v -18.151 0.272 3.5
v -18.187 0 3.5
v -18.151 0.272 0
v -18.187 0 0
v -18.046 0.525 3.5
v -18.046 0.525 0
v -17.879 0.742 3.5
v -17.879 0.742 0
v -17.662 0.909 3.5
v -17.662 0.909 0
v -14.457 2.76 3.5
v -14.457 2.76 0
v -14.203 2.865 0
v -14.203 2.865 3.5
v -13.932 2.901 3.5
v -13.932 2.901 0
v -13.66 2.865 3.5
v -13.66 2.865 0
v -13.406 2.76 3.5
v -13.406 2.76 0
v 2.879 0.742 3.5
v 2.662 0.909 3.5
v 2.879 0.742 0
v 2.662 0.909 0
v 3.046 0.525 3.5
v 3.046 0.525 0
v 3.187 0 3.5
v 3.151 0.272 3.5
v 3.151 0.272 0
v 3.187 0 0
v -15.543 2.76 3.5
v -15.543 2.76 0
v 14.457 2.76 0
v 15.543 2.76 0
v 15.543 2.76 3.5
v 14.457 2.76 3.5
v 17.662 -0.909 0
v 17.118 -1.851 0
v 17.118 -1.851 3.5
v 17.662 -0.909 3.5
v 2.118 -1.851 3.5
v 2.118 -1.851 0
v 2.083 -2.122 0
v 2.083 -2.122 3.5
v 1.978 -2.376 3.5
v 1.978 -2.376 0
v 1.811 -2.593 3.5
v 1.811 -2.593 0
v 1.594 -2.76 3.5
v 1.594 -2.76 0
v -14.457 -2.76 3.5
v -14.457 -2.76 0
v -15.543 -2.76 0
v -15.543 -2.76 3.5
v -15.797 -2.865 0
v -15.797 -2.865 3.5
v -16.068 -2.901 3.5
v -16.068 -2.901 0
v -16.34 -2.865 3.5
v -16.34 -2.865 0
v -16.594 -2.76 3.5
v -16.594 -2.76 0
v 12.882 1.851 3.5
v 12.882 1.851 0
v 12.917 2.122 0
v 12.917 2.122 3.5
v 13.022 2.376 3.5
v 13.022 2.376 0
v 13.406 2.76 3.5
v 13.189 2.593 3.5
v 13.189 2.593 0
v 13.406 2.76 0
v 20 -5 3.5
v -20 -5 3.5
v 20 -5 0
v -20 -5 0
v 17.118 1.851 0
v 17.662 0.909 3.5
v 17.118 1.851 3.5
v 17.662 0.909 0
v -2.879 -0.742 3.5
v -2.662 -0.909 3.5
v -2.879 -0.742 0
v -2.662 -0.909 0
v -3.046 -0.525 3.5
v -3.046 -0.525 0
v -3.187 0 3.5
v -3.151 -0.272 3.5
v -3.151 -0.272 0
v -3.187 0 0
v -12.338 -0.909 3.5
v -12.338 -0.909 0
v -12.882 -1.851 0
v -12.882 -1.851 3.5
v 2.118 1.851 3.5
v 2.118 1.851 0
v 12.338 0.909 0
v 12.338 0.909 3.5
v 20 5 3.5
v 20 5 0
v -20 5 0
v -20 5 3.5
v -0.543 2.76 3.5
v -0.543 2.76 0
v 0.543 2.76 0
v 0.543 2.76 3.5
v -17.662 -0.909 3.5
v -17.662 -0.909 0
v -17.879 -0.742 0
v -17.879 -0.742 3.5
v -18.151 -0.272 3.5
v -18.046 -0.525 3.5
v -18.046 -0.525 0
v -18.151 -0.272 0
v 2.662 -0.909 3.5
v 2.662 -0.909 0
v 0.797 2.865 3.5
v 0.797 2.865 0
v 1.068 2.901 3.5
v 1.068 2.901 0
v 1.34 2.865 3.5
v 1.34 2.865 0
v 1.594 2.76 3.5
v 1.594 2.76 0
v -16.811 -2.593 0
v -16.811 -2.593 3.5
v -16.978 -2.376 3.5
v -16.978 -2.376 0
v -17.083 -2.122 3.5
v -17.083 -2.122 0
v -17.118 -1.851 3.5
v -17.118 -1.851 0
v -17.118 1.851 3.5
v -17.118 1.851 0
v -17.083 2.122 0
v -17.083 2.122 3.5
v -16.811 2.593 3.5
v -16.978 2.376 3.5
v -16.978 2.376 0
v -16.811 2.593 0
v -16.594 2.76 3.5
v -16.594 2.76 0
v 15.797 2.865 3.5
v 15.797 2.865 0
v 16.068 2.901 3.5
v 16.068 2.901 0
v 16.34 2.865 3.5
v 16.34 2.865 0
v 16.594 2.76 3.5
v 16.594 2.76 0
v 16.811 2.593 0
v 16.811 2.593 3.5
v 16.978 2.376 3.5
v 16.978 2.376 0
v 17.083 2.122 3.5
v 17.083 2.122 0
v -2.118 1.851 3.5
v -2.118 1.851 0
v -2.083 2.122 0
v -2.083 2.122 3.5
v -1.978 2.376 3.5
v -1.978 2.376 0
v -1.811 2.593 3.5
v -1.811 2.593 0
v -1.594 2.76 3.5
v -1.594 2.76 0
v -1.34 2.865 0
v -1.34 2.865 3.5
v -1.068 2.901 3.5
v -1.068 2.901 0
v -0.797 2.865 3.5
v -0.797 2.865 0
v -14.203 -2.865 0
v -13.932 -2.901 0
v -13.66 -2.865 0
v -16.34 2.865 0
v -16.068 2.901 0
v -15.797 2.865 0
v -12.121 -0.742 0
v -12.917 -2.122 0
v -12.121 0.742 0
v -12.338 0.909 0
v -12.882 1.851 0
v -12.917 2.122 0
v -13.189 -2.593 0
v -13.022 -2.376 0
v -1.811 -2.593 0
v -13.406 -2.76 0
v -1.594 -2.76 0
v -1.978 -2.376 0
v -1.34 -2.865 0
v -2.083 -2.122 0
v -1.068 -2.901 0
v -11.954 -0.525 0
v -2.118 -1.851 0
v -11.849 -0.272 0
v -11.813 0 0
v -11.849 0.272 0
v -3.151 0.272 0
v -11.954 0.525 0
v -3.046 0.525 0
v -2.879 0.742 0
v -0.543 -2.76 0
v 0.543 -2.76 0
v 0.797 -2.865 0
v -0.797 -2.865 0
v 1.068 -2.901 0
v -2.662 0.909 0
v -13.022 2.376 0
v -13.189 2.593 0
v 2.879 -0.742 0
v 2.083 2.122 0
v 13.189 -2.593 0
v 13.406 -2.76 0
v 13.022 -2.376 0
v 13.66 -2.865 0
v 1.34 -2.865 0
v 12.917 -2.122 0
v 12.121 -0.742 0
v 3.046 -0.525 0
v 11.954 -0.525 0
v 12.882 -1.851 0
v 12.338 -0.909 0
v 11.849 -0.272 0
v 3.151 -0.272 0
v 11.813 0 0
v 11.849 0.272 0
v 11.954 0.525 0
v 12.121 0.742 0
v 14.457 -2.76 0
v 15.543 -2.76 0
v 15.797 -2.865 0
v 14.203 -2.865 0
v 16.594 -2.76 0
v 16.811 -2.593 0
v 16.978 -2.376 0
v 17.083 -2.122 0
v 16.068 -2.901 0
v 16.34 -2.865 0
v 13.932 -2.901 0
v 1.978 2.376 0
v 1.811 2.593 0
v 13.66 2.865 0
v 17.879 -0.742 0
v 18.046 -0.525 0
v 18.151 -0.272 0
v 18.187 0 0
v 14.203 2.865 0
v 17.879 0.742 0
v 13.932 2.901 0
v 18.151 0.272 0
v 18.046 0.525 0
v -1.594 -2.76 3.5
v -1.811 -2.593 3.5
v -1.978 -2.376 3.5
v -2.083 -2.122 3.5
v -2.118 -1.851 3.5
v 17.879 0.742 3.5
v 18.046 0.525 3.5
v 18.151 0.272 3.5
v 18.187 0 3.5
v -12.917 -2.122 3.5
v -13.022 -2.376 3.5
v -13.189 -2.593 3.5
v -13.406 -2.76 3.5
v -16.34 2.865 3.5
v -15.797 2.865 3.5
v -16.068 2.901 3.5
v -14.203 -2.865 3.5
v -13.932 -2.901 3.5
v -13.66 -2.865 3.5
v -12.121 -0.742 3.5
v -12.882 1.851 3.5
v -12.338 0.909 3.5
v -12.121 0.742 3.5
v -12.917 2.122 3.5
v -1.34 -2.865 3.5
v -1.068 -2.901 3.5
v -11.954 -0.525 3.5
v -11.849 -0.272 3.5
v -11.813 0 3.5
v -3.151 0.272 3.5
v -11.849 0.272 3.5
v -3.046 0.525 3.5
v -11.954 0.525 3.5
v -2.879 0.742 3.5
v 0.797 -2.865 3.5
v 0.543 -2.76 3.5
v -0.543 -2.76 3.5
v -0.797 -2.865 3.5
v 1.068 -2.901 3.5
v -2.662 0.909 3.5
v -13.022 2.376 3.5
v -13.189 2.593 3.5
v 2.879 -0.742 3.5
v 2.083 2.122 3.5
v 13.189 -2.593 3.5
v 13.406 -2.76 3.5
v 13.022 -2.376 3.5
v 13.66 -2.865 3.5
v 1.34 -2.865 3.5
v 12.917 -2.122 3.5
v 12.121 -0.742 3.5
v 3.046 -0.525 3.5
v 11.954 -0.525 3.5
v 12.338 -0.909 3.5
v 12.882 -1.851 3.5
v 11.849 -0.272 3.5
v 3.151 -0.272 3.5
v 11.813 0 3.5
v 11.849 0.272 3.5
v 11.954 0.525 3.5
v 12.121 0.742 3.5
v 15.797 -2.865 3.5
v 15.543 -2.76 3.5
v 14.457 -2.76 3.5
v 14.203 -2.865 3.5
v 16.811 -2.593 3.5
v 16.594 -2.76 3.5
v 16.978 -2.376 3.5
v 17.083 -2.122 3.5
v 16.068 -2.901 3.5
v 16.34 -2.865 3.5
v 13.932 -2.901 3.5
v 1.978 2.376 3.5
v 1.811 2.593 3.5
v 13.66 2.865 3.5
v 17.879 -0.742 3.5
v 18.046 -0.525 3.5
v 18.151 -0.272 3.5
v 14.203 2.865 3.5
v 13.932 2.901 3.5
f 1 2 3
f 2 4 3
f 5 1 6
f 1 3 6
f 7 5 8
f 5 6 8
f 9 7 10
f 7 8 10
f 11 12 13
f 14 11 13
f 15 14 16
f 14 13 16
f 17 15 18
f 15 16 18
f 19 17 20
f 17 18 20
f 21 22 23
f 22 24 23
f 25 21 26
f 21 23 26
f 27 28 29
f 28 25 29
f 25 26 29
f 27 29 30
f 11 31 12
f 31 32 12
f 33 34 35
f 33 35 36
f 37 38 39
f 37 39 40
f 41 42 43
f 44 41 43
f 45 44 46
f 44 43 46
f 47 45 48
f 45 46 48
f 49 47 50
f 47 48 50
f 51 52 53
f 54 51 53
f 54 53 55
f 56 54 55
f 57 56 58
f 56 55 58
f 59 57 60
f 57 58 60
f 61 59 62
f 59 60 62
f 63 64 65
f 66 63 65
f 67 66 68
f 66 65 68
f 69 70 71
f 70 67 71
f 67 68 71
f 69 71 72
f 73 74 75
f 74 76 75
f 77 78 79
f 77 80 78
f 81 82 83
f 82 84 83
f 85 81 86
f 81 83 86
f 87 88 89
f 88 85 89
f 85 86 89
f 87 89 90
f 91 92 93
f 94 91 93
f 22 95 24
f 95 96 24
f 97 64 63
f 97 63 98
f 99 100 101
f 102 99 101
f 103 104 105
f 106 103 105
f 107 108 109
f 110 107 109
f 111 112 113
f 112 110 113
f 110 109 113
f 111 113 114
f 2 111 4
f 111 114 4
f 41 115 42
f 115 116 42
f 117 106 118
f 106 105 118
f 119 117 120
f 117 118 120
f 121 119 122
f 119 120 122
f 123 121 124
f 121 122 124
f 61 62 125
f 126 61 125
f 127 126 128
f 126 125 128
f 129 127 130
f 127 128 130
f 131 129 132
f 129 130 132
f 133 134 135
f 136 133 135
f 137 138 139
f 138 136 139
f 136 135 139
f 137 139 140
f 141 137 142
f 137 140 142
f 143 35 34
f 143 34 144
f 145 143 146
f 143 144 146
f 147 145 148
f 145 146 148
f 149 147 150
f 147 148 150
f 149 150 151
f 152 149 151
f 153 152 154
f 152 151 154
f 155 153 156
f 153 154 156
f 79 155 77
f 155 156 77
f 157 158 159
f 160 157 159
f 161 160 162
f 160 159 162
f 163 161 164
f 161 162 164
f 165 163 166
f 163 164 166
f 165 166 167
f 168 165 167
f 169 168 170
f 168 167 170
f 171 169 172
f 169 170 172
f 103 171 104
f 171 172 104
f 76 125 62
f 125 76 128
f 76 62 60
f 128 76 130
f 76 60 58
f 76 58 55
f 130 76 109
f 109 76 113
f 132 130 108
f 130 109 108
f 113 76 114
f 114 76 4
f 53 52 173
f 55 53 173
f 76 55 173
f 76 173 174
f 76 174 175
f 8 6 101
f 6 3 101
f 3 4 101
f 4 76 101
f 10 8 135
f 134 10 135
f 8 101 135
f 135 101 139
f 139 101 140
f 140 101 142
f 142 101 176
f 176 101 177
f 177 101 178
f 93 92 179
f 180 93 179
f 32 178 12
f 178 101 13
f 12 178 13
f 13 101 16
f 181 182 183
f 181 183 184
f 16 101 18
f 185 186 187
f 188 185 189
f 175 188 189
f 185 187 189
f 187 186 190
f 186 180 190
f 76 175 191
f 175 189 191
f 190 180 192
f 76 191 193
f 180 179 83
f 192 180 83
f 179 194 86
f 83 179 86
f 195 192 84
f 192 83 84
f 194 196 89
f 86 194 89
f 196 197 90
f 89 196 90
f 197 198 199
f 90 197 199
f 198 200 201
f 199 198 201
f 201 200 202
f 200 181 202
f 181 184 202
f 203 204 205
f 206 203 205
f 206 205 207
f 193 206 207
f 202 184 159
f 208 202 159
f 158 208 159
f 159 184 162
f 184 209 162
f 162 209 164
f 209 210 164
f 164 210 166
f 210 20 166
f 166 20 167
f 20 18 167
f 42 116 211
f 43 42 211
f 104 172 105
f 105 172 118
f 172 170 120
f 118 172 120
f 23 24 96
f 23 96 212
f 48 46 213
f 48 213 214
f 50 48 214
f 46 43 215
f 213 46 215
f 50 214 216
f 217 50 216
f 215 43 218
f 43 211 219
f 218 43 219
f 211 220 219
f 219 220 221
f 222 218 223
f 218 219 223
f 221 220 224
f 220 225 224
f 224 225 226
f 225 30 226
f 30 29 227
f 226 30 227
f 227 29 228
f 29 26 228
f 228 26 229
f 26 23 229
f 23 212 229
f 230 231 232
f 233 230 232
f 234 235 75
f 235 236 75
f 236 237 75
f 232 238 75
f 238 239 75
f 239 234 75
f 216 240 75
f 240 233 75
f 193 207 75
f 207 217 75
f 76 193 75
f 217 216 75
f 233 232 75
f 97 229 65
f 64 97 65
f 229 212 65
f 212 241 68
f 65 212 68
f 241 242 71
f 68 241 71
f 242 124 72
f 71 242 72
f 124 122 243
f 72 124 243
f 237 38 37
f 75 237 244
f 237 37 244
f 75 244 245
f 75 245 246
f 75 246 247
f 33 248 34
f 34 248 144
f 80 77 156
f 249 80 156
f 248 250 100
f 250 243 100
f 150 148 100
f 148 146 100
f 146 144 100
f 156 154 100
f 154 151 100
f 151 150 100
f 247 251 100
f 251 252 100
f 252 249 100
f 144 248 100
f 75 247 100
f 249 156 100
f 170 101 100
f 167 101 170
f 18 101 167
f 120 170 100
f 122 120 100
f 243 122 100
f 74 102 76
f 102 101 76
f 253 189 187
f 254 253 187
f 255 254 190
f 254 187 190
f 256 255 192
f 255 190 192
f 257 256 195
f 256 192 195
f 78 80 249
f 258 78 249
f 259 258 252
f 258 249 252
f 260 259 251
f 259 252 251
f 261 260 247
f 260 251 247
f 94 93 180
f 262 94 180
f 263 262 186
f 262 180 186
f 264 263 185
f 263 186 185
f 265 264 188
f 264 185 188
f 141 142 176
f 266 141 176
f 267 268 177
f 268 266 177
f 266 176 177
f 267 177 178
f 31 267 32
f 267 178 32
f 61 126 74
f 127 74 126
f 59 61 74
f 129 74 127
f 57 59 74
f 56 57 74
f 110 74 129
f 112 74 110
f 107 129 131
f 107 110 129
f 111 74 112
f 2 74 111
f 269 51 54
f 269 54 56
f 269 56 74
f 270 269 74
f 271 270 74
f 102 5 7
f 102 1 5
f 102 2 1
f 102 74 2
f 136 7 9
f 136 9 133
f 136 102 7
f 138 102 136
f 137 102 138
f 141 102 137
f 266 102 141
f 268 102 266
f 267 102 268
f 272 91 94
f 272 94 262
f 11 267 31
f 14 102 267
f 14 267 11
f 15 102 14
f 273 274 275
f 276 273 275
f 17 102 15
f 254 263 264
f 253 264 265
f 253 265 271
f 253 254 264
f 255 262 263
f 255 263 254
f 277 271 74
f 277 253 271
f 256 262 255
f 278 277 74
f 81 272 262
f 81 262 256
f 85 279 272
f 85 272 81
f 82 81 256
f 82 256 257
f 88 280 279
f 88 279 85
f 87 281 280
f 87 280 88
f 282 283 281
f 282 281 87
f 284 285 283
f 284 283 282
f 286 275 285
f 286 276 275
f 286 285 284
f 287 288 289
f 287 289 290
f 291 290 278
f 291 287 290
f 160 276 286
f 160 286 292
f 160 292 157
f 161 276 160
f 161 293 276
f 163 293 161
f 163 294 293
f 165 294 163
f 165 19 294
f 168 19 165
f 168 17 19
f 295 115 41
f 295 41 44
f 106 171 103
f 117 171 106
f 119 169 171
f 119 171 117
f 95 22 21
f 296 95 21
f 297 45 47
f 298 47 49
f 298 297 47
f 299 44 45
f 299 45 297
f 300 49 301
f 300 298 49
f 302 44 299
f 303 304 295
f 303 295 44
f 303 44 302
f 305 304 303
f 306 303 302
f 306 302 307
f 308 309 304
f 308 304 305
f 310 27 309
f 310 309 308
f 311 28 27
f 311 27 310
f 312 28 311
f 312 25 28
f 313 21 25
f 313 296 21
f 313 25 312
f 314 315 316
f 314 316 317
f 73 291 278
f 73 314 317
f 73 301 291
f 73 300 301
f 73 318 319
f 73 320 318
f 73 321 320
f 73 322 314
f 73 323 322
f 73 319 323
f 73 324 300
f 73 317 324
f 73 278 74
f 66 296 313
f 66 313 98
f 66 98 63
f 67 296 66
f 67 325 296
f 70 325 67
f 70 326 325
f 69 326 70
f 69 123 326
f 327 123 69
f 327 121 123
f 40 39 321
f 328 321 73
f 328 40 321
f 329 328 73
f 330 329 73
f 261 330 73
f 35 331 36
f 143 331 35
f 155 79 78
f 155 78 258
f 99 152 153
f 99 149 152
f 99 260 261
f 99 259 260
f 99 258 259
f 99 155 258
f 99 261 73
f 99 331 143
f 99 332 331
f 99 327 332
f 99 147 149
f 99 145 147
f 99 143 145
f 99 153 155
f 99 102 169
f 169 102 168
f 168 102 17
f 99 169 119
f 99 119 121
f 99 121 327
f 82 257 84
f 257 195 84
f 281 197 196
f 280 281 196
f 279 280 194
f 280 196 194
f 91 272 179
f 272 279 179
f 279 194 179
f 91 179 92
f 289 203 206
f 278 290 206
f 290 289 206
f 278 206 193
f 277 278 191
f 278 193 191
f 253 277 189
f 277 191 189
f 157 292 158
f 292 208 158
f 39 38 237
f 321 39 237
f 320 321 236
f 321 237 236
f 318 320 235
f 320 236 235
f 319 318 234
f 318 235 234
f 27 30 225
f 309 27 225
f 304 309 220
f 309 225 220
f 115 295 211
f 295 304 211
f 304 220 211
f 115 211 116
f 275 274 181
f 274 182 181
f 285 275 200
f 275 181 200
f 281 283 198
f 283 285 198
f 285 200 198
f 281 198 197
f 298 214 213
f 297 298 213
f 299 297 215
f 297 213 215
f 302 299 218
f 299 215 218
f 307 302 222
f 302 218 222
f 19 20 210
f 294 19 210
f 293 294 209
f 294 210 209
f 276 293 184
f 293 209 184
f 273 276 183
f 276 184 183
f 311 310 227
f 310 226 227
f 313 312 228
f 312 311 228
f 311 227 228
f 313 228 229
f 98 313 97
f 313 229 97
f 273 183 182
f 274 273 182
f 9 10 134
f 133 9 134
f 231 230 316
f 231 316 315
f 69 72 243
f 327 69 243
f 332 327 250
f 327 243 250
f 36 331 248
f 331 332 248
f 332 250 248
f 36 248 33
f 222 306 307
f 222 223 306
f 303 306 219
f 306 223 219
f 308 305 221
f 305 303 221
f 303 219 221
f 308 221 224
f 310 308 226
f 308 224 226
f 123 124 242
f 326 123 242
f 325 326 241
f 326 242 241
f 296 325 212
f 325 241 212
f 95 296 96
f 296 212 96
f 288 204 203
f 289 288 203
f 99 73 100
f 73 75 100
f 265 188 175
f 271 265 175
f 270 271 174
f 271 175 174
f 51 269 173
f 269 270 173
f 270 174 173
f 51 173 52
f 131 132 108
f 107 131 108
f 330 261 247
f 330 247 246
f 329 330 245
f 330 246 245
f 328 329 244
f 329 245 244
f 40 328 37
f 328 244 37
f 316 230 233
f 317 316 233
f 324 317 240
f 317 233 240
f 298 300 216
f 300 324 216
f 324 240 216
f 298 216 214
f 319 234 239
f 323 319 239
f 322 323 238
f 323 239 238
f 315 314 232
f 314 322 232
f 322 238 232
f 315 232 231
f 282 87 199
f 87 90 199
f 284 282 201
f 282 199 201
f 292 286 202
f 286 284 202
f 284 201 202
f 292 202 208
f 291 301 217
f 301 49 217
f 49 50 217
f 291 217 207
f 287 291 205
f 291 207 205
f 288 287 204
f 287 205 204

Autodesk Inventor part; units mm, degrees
ref_plane "YZ Plane" through (0, 0, 0) normal (1, 0, 0) x (0, 1, 0)
ref_plane "XZ Plane" through (0, 0, 0) normal (0, 1, 0) x (-1, 0, 0)
ref_plane "XY Plane" through (0, 0, 0) normal (0, 0, 1) x (1, 0, 0)
sketch "スケッチ1" plane through (0, 0, 0) normal (0, 0, 1) x (1, 0, 0)
  line L0 (-20, -5) -> (20, -5)
  line L1 (20, -5) -> (20, 5)
  line L2 (20, 5) -> (-20, 5)
  line L3 (-20, 5) -> (-20, -5)
  line L4 (-20, -5) -> (20, 5) construction
  line L5 (20, -5) -> (-20, 5) construction
  circle A0 centre (-15, 0) radius 1.55
  circle A1 centre (0, 0) radius 1.55
  line L6 (0, 0) -> (0, 5) construction
  line L7 (-12.5995, 5) -> (4.4005, 5) construction
  line L8 (-8.5, -4) -> (8.5, -4) construction
  line L9 (-13.4065, -2.76) -> (-16.5935, -2.76)
  line L10 (-16.5935, -2.76) -> (-18.187, 0)
  line L11 (-18.187, 0) -> (-16.5935, 2.76)
  line L12 (-16.5935, 2.76) -> (-13.4065, 2.76)
  line L13 (-13.4065, 2.76) -> (-11.813, 0)
  line L14 (-11.813, 0) -> (-13.4065, -2.76)
  circle A2 centre (-17.137, 0) radius 1.05
  circle A3 centre (-16.0685, -1.8507) radius 1.05
  circle A4 centre (-13.9315, -1.8507) radius 1.05
  circle A5 centre (-12.863, 0) radius 1.05
  circle A6 centre (-13.9315, 1.8507) radius 1.05
  circle A7 centre (-16.0685, 1.8507) radius 1.05
  circle A8 centre (15, 0) radius 1.55
  line L15 (13.4065, -2.76) -> (16.5935, -2.76)
  line L16 (16.5935, -2.76) -> (18.187, 0)
  line L17 (18.187, 0) -> (16.5935, 2.76)
  line L18 (16.5935, 2.76) -> (13.4065, 2.76)
  line L19 (13.4065, 2.76) -> (11.813, 0)
  line L20 (11.813, 0) -> (13.4065, -2.76)
  circle A9 centre (17.137, 0) radius 1.05
  circle A10 centre (16.0685, -1.8507) radius 1.05
  circle A11 centre (13.9315, -1.8507) radius 1.05
  circle A12 centre (12.863, 0) radius 1.05
  circle A13 centre (13.9315, 1.8507) radius 1.05
  circle A14 centre (16.0685, 1.8507) radius 1.05
  circle A15 centre (-15, 0) radius 5 construction
  line L21 (1.5935, -2.76) -> (-1.5935, -2.76)
  line L22 (-1.5935, -2.76) -> (-3.187, 0)
  line L23 (-3.187, 0) -> (-1.5935, 2.76)
  line L24 (-1.5935, 2.76) -> (1.5935, 2.76)
  line L25 (1.5935, 2.76) -> (3.187, 0)
  line L26 (3.187, 0) -> (1.5935, -2.76)
  circle A16 centre (-2.137, 0) radius 1.05
  circle A17 centre (-1.0685, -1.8507) radius 1.05
  circle A18 centre (1.0685, -1.8507) radius 1.05
  circle A19 centre (2.137, 0) radius 1.05
  circle A20 centre (1.0685, 1.8507) radius 1.05
  circle A21 centre (-1.0685, 1.8507) radius 1.05
  point P0 (-16.5935, -2.76)
  point P1 (-13.4065, -2.76)
  point P2 (-11.813, 0)
  point P3 (-13.4065, 2.76)
  point P4 (-16.5935, 2.76)
  point P5 (16.5935, -2.76)
  point P6 (13.4065, -2.76)
  point P7 (11.813, 0)
  point P8 (13.4065, 2.76)
  point P9 (16.5935, 2.76)
  point P10 (-1.5935, -2.76)
  point P11 (1.5935, -2.76)
  point P12 (3.187, 0)
  point P13 (1.5935, 2.76)
  dimension "d19" = 2.1
  dimension "d1" = 3.1
  dimension "d4" = 15
  dimension "d5" = 10
  dimension "d20" = 5.52
  dimension "d23" = 360
  dimension "d33" = 360
extrude "押し出し1" add sketch "スケッチ1" along normal blind 3.5
properties part number "胴体_サブフレーム_1_2" material "アセタール樹脂、黒"
